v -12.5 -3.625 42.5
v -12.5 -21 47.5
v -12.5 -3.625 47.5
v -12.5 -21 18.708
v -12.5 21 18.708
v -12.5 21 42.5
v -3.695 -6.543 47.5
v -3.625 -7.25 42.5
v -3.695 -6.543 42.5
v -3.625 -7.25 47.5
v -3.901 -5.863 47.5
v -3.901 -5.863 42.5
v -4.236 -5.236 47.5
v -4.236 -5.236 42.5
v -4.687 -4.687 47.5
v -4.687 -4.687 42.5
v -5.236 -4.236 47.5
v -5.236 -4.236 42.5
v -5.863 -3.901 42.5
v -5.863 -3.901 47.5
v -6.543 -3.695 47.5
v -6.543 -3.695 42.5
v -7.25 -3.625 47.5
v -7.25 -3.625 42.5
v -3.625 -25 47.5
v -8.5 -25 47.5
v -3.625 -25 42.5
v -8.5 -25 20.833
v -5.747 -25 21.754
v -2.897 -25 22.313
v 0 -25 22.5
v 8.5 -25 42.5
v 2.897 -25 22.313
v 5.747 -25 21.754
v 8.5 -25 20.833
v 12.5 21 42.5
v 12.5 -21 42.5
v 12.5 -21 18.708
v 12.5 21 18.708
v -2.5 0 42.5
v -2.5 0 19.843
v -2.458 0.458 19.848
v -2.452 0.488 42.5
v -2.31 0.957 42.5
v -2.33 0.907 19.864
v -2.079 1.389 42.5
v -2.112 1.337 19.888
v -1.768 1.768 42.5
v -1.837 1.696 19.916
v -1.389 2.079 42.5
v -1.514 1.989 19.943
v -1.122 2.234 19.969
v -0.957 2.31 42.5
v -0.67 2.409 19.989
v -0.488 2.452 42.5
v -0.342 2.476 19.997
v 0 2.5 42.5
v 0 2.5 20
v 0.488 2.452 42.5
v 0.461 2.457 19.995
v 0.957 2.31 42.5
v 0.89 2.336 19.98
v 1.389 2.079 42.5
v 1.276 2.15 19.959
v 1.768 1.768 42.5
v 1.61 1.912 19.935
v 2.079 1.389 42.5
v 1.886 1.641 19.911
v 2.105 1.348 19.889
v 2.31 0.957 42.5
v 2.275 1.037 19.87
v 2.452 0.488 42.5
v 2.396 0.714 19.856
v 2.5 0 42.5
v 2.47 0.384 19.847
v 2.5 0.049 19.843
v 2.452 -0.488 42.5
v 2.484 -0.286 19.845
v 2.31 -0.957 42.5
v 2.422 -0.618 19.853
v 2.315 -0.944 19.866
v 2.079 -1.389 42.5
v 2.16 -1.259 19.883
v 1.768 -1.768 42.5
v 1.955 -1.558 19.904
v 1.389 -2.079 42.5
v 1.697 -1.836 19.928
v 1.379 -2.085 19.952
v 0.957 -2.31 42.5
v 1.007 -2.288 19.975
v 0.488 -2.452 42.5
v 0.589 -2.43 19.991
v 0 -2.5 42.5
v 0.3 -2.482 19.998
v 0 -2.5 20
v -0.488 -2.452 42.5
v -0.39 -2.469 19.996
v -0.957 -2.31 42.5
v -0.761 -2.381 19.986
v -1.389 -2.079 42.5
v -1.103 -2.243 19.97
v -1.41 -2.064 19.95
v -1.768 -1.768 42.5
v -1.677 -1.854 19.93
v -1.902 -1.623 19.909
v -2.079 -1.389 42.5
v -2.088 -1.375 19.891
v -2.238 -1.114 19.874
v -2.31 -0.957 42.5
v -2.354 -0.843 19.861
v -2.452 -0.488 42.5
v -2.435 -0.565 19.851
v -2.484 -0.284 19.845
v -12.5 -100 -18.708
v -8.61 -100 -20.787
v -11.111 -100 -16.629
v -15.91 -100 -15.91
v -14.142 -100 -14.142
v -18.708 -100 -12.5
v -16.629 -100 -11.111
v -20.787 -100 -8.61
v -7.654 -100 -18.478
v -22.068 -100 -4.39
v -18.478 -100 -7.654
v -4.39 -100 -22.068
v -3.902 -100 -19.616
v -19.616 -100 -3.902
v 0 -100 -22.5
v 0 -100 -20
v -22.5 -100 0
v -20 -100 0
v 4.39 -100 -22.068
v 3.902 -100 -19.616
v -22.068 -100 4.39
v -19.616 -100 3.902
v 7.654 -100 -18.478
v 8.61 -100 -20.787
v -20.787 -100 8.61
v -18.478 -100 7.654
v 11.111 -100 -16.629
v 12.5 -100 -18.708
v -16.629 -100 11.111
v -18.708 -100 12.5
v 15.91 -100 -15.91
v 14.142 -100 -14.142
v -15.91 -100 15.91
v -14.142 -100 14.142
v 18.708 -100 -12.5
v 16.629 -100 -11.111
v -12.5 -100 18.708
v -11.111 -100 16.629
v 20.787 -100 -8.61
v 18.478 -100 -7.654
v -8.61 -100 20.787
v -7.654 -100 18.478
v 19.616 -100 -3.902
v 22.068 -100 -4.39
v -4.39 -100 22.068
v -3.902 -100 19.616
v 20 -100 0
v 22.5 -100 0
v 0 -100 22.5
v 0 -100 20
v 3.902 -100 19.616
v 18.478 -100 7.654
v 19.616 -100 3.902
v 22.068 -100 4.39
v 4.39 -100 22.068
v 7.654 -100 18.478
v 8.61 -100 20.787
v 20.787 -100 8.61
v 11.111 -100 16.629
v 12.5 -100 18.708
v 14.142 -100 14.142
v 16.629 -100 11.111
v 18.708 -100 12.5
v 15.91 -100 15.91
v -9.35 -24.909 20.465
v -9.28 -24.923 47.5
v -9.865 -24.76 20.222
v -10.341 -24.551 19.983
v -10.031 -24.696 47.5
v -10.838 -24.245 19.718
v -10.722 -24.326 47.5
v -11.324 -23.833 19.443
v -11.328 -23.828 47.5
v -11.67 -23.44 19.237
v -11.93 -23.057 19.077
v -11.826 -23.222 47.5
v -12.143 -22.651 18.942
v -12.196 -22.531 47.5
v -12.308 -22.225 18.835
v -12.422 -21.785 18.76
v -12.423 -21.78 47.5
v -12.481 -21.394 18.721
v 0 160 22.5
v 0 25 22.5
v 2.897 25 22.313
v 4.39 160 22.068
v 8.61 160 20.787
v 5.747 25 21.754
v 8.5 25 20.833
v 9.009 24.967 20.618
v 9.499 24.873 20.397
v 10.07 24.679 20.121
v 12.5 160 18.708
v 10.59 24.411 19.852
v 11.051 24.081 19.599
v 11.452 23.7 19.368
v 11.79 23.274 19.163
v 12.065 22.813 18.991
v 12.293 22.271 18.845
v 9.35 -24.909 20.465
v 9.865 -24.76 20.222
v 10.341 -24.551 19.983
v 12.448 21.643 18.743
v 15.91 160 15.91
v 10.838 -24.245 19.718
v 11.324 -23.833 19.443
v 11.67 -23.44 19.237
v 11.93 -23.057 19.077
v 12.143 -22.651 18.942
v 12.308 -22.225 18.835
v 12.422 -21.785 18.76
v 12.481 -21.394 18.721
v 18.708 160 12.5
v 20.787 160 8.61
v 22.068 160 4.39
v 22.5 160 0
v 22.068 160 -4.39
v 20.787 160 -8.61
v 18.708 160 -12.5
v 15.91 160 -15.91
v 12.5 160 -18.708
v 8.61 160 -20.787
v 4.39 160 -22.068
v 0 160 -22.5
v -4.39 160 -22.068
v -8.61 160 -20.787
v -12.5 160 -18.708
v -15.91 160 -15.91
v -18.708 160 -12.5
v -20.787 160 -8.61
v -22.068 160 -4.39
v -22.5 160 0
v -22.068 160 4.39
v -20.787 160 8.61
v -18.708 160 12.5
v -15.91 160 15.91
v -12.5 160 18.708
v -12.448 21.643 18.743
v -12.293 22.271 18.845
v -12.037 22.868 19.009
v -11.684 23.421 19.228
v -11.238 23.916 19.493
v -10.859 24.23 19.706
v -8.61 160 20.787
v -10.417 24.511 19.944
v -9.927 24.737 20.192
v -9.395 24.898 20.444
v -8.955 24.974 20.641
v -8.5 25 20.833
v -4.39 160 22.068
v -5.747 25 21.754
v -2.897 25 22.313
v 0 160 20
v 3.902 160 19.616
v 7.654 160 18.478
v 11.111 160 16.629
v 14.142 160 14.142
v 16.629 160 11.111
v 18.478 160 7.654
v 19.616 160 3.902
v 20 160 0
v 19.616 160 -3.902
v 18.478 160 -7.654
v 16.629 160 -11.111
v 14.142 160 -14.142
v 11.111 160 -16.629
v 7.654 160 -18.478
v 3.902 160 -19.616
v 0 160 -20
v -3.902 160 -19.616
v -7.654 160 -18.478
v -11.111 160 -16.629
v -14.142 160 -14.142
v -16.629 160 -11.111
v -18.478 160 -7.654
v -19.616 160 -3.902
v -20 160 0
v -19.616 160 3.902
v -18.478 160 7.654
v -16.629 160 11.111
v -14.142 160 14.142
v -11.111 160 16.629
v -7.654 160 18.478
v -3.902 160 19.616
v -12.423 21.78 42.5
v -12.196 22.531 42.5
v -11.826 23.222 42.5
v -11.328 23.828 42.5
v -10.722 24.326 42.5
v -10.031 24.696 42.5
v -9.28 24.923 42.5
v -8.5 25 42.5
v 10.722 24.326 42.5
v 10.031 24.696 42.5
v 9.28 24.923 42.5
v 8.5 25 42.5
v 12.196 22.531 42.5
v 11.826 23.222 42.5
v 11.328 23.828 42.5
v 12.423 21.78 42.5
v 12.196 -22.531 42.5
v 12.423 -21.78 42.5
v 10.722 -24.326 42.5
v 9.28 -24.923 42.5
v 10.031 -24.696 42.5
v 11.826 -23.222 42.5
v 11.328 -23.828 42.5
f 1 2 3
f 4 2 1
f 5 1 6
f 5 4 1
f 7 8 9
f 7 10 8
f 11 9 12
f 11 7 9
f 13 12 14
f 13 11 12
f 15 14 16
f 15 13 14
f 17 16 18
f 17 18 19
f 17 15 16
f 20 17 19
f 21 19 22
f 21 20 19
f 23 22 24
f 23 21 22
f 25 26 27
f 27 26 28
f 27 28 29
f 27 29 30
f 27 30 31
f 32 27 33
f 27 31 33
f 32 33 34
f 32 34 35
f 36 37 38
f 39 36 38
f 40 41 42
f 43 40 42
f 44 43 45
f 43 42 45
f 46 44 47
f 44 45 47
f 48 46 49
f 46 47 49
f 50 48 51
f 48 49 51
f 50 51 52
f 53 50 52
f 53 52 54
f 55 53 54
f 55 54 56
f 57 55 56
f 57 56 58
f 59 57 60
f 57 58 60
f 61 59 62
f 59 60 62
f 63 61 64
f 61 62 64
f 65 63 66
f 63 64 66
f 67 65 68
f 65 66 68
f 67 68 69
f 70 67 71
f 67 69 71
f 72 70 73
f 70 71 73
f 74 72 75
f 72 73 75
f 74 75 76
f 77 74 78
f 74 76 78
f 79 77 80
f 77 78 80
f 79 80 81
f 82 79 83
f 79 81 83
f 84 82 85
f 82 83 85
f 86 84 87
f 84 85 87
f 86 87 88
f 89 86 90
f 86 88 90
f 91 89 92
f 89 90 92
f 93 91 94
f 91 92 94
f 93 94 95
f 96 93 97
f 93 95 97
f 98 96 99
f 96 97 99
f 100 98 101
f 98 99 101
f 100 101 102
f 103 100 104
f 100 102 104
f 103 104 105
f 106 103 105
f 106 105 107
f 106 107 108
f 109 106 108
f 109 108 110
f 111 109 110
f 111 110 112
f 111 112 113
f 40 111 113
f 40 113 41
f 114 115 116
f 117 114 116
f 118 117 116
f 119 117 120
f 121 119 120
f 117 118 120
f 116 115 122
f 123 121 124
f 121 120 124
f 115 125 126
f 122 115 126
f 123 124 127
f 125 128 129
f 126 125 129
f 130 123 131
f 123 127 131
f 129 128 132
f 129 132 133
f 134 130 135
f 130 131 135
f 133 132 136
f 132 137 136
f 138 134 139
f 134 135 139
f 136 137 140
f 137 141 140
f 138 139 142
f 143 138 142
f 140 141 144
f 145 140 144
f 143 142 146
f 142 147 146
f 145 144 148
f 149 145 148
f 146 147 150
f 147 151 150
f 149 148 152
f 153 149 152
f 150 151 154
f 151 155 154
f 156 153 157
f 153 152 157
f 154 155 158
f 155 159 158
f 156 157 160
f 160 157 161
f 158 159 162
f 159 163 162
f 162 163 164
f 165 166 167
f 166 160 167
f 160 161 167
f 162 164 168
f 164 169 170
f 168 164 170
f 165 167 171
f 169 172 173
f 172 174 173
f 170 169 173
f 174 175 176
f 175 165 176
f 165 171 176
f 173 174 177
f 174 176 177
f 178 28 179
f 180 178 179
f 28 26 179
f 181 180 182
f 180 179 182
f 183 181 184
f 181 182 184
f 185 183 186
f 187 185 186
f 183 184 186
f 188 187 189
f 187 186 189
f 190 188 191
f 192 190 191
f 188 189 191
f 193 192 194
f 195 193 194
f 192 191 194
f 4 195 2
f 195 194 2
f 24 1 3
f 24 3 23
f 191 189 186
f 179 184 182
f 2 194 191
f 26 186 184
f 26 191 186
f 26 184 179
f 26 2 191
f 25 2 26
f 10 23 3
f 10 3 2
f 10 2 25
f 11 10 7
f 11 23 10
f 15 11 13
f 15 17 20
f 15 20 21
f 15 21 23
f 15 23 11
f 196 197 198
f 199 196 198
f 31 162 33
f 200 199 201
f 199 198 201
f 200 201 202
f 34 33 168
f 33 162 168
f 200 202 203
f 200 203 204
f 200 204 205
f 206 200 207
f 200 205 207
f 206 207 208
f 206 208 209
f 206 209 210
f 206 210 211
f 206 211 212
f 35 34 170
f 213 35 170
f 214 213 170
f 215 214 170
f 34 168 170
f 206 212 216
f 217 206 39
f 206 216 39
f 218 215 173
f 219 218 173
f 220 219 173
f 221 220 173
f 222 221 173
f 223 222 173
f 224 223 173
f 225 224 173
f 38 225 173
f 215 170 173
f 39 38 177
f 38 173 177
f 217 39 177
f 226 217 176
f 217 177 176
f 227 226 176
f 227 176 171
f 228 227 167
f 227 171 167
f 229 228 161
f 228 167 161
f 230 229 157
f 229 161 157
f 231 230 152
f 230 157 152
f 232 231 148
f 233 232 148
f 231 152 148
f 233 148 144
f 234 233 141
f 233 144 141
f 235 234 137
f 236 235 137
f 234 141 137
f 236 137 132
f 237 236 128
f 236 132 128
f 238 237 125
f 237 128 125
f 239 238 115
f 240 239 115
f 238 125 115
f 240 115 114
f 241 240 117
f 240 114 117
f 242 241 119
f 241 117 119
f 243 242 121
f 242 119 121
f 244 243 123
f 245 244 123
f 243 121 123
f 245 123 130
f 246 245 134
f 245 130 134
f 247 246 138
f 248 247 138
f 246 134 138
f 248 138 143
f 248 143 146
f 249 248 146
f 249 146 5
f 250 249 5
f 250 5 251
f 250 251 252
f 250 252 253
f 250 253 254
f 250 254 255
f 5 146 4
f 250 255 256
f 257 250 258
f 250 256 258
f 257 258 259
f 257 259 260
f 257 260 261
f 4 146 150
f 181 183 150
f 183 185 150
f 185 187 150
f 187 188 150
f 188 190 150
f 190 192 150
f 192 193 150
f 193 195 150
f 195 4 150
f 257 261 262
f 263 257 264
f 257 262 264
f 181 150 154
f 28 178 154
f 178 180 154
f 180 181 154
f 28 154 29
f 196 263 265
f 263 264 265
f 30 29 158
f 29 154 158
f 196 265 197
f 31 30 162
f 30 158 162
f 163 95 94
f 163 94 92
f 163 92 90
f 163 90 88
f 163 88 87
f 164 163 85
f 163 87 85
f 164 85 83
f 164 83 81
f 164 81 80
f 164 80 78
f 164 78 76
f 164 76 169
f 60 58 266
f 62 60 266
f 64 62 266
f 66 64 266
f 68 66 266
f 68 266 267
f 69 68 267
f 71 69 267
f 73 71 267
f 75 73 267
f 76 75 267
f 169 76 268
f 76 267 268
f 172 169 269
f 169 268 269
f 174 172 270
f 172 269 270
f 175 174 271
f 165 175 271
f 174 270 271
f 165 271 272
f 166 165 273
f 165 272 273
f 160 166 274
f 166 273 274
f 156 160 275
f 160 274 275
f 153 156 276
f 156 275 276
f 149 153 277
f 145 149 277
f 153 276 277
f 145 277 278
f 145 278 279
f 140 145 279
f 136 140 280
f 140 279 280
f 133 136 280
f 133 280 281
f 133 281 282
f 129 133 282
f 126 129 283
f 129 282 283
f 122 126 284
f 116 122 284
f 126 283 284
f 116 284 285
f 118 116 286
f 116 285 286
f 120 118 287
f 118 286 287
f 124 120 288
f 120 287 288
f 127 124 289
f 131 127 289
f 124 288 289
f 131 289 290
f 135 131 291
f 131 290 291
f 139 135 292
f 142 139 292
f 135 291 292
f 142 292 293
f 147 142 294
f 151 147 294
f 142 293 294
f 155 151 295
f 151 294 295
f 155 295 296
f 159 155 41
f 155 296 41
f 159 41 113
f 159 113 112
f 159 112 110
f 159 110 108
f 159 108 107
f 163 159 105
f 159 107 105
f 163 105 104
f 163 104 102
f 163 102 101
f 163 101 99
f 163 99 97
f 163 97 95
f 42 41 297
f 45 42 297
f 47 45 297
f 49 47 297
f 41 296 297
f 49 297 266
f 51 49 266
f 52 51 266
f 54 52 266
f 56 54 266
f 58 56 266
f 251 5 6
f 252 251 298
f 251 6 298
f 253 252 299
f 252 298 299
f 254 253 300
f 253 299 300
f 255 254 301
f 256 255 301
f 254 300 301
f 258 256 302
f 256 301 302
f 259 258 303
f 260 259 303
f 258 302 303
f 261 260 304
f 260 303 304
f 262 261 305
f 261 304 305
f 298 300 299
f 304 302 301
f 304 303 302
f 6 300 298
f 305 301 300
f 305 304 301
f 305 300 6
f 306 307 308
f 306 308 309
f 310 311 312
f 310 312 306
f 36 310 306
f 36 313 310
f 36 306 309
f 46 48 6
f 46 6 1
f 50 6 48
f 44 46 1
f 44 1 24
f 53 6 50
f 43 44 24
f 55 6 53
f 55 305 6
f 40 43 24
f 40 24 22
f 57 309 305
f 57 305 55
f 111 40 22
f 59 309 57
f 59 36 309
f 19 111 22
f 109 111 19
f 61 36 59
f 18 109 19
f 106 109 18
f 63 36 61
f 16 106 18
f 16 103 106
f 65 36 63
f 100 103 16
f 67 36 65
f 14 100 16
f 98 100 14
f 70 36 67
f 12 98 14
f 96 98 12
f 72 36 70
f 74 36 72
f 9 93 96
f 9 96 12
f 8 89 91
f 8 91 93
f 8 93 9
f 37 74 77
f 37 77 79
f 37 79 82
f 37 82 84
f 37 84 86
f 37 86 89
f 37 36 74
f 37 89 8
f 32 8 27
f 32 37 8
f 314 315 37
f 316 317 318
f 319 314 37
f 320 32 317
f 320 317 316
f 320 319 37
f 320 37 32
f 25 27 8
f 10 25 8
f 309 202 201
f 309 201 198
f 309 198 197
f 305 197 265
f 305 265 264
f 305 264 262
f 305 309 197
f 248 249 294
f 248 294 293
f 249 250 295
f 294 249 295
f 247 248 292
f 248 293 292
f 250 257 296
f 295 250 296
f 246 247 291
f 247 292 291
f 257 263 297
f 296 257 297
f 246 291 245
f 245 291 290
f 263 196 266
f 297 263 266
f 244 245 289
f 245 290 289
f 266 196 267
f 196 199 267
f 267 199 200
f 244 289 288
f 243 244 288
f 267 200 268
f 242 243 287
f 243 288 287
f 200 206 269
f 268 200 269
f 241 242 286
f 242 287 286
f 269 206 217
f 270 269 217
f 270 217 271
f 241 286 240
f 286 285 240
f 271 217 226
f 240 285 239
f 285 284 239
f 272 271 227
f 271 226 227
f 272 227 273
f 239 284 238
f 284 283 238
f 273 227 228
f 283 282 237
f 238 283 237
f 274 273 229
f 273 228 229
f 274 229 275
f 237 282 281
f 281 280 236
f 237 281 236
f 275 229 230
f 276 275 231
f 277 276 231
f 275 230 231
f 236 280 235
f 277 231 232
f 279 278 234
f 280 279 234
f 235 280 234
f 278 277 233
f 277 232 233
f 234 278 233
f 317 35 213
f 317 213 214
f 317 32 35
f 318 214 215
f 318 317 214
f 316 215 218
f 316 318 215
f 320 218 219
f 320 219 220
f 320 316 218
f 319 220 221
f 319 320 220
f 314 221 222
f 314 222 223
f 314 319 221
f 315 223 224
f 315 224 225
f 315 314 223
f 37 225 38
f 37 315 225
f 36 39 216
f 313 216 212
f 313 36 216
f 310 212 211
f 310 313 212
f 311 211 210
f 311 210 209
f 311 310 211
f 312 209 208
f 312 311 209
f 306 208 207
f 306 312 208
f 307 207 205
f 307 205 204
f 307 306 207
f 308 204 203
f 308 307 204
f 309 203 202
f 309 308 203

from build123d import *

# Parameters (mm, degrees)
F2_DEPTH = 12.5
F4_DEPTH = 50
F6_D     = 5
F6_DEPTH = 50
F6_TIP   = 1.5021515476
F7_W     = 8.875
F7_H     = 21.375
F8_DEPTH = 5
F9_R     = 3.625
F10_R    = 4


# Not quite as in the source:
# - a feature names something its author has since deleted; it is built from what else it names


with BuildPart() as f1:
    # F0 (on Right) → F1 (revolve)
    with BuildSketch(Plane.YZ):
        Polygon((-25, 22.5), (-100, 22.5), (-100, 20), (0, 20), (100, 20), (160, 20), (160, 22.5), (100, 22.5), (25, 22.5), (0, 22.5), align=None)
    revolve(axis=Axis((0, 2.0652181371, 0), (0, 1, 0)))

    # F0 (on Right) → F2 (join, symmetric)
    with BuildSketch(Plane.YZ):
        Polygon((-25, 42.5), (-25, 22.5), (0, 22.5), (25, 22.5), (25, 42.5), (0, 42.5), align=None)
    extrude(amount=F2_DEPTH, both=True)

    # F3 (on face) → F4 (join)
    with BuildSketch(Plane(origin=(0, 25, 0), x_dir=(-1, 0, 0), z_dir=(0, 1, 0))):
        Polygon((0, 22.5), (-12.5, 22.5), (-12.5, 18.6568256468), align=None)
        Polygon((12.5, 22.5), (0, 22.5), (12.5, 18.6568256468), align=None)
    extrude(amount=-F4_DEPTH)

    # F6
    with Locations(Plane.XY.offset(42.5)):
        with Locations((0, 0)):
            Hole(F6_D / 2, depth=F6_DEPTH)
            with Locations((0, 0, -(F6_DEPTH + F6_TIP / 2))):  # 118° drill point
                Cone(0, F6_D / 2, F6_TIP, mode=Mode.SUBTRACT)

    # F7 (on face) → F8 (join)
    with BuildSketch(Plane.XY.offset(42.5)):
        with Locations((-8.0625, -14.3125)):
            Rectangle(F7_W, F7_H)
    extrude(amount=F8_DEPTH)

    # F9
    f9_edges = [f1.edges().sort_by_distance(p)[0] for p in [
        (-3.625, -3.625, 45),
    ]]
    fillet(f9_edges, radius=F9_R)

    # F10
    f10_edges = [f1.edges().sort_by_distance(p)[0] for p in [
        (12.5, 25, 30.604143),
        (12.5, -25, 30.604143),
        (-12.5, 25, 30.604143),
        (-12.5, -25, 33.104143),
    ]]
    fillet(f10_edges, radius=F10_R)


solid = f1.part
